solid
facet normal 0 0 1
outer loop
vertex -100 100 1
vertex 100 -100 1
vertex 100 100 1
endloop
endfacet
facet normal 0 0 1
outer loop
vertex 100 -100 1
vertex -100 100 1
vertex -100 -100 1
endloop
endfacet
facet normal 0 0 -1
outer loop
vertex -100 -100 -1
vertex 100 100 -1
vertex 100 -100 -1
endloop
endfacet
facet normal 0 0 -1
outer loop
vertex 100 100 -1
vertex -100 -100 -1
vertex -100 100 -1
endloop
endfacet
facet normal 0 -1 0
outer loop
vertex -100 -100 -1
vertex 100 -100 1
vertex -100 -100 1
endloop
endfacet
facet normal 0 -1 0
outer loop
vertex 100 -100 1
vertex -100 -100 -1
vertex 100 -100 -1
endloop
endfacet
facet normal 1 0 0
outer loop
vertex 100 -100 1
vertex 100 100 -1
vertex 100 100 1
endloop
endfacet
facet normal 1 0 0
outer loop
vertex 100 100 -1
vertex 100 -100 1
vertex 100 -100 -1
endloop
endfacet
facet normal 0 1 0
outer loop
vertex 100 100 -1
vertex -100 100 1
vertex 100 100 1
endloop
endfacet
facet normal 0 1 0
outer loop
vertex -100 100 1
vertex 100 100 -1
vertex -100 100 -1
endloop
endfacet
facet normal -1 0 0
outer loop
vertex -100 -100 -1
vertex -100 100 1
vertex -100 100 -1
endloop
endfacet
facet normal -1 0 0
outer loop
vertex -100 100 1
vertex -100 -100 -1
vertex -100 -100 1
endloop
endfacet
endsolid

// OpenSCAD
$fn = 64;

length = 200;
width  = 200;
thickness = 2;

// Ensure a clearly visible, non-zero sheet thickness
min_th = 2;
th = max(thickness, min_th);

// One connected solid: a single sheet
cube([length, width, th], center=true);
